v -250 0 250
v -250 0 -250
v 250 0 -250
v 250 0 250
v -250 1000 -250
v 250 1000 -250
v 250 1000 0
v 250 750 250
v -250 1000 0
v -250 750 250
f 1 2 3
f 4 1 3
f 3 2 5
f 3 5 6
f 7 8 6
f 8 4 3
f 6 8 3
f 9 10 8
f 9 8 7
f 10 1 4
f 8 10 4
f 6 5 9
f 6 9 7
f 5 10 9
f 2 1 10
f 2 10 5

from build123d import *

# Parameters (mm, degrees)
SKETCH1_W           = 500
SKETCH1_H           = 500
BOSS_EXTRUDE1_DEPTH = 1000
CUT_EXTRUDE1_REACH  = 1147.644


with BuildPart() as part:
    # Sketch1 → Boss-Extrude1 (new body)
    with BuildSketch(Plane(origin=(0, 0, 0), x_dir=(1, 0, 0), z_dir=(0, 1, 0))):
        Rectangle(SKETCH1_W, SKETCH1_H)
    extrude(amount=BOSS_EXTRUDE1_DEPTH)

    # Sketch3 → Cut-Extrude1 (cut, up to next)
    with BuildSketch(Plane(origin=(250, 0, 0), x_dir=(0, 0, -1), z_dir=(1, 0, 0)), mode=Mode.PRIVATE) as cut_extrude1_sk1:
        Polygon((-250, 750), (0, 1000), (-250, 1000), align=None)
    cut_extrude1_tool1 = extrude(cut_extrude1_sk1.sketch, amount=-CUT_EXTRUDE1_REACH, mode=Mode.PRIVATE) & part.part
    add(cut_extrude1_tool1.solids().sort_by_distance((250, 916.666667, 166.666667))[0], mode=Mode.SUBTRACT)


solid = part.part
